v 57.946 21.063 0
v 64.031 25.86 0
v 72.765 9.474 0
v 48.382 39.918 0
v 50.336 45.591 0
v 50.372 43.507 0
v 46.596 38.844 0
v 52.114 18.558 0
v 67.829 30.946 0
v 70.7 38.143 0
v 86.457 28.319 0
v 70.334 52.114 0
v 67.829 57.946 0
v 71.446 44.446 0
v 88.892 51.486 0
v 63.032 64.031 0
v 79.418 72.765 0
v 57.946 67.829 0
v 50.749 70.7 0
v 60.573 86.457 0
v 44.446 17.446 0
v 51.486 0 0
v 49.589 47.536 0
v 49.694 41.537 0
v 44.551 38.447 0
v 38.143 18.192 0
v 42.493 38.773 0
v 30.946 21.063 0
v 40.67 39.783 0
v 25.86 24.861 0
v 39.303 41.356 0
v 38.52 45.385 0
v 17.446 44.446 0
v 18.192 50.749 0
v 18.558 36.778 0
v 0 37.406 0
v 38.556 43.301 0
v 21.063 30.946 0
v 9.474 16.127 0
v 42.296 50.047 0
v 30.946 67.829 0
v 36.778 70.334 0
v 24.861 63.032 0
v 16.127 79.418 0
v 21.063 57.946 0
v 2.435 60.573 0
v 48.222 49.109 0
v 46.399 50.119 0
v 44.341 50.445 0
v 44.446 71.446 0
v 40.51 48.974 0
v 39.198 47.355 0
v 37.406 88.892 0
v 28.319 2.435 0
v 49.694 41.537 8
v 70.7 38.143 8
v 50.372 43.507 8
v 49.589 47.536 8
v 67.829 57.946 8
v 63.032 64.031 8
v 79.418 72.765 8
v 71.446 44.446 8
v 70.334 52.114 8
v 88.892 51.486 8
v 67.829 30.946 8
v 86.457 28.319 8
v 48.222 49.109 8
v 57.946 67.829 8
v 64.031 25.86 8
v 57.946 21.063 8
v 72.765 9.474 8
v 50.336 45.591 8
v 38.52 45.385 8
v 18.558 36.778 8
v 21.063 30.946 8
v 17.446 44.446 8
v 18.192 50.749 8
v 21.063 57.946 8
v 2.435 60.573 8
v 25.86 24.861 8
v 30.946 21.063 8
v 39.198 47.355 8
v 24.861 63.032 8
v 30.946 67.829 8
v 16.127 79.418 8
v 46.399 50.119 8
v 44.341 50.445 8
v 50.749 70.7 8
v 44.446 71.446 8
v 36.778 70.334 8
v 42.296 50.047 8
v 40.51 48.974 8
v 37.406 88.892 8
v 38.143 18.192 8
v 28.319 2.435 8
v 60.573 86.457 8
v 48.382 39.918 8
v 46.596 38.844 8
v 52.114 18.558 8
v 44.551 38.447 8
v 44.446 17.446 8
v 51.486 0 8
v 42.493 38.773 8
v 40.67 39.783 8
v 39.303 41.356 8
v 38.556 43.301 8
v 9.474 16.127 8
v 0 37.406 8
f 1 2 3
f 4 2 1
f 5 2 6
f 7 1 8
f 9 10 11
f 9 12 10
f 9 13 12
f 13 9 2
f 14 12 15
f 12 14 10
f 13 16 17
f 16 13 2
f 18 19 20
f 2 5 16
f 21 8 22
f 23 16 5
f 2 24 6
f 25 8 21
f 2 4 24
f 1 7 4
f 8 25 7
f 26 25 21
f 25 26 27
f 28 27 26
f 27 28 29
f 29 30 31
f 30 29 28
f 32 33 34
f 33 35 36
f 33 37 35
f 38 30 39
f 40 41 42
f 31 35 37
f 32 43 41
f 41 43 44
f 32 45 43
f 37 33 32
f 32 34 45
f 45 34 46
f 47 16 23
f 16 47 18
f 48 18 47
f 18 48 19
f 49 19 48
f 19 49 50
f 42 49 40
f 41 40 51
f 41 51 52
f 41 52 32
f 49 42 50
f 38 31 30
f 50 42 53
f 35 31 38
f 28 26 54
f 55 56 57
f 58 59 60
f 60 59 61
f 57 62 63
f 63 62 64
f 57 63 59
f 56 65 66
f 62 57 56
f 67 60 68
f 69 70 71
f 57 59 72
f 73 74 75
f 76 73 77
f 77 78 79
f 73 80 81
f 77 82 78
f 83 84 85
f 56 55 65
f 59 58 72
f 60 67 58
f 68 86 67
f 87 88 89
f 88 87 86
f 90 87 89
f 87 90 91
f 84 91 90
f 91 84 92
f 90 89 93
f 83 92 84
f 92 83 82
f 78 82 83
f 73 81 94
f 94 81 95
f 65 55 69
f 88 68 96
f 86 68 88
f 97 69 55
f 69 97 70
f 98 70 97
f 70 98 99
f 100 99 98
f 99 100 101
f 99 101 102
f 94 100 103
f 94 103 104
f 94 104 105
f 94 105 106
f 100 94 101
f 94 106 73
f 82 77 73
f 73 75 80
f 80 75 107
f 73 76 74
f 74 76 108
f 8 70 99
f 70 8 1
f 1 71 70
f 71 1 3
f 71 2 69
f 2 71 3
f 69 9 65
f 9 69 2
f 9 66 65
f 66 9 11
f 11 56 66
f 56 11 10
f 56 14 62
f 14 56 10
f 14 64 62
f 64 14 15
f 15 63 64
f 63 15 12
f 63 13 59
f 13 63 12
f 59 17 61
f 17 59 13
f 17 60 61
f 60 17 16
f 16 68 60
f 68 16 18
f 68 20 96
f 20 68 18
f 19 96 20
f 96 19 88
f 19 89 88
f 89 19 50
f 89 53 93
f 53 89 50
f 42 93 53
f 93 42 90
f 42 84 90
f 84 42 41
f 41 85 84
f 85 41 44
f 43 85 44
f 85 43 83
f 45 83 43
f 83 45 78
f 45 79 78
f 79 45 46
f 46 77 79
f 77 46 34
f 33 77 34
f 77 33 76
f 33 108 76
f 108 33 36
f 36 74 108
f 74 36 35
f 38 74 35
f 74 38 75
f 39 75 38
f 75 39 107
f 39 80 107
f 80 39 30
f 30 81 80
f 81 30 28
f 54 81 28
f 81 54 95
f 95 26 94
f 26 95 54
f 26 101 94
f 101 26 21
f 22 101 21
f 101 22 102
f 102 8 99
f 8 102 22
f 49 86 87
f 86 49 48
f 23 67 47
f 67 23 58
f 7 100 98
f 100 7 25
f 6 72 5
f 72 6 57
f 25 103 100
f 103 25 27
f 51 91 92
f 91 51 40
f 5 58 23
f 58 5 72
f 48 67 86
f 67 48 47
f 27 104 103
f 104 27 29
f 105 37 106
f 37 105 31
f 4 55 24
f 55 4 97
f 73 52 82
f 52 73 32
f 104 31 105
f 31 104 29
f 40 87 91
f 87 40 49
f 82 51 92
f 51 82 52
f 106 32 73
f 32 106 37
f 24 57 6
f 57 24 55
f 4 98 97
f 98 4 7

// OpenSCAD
$fn = 32;

// ----------------------------------------------------------------------
// Star wheel: 12-point ratchet, R45
// ----------------------------------------------------------------------

// --- parameters (mm) ---
n_points = 12;            // number of points / teeth
r_out = 45;               // tip radius
r_in = 27;                // root radius
bore_r = 6;               // centre bore radius
plate_t = 8;              // plate thickness, Z (extrusion height)
bore_d = 12;              // centre bore diameter
fit_tol = 0.1;            // declared fit tolerance (prompt contract)
free_tol = 0.3;           // declared free tolerance (prompt contract)

profile = [[44.446, 71.446], [37.406, 88.892], [36.778, 70.334], [30.946, 67.829], [16.127, 79.418], [24.861, 63.032], [21.063, 57.946], [2.435, 60.573], [18.192, 50.749], [17.446, 44.446], [0, 37.406], [18.558, 36.778], [21.063, 30.946], [9.474, 16.127], [25.86, 24.861], [30.946, 21.063], [28.319, 2.435], [38.143, 18.192], [44.446, 17.446], [51.486, 0], [52.114, 18.558], [57.946, 21.063], [72.765, 9.474], [64.031, 25.86], [67.829, 30.946], [86.457, 28.319], [70.7, 38.143], [71.446, 44.446], [88.892, 51.486], [70.334, 52.114], [67.829, 57.946], [79.418, 72.765], [63.032, 64.031], [57.946, 67.829], [60.573, 86.457], [50.749, 70.7]];  // primary outline, 36 points, counter clockwise
void_1 = [[50.336, 45.591], [49.589, 47.536], [48.222, 49.109], [46.399, 50.119], [44.341, 50.445], [42.296, 50.047], [40.51, 48.974], [39.198, 47.355], [38.52, 45.385], [38.556, 43.301], [39.303, 41.356], [40.67, 39.783], [42.493, 38.773], [44.551, 38.447], [46.596, 38.844], [48.382, 39.918], [49.694, 41.537], [50.372, 43.507]];  // centre bore, 18 points

// --- the one profile operation ---
difference() {
  linear_extrude(height = plate_t) polygon(points = profile);
  translate([0, 0, -1])
    linear_extrude(height = plate_t + 2) polygon(points = void_1);
}
